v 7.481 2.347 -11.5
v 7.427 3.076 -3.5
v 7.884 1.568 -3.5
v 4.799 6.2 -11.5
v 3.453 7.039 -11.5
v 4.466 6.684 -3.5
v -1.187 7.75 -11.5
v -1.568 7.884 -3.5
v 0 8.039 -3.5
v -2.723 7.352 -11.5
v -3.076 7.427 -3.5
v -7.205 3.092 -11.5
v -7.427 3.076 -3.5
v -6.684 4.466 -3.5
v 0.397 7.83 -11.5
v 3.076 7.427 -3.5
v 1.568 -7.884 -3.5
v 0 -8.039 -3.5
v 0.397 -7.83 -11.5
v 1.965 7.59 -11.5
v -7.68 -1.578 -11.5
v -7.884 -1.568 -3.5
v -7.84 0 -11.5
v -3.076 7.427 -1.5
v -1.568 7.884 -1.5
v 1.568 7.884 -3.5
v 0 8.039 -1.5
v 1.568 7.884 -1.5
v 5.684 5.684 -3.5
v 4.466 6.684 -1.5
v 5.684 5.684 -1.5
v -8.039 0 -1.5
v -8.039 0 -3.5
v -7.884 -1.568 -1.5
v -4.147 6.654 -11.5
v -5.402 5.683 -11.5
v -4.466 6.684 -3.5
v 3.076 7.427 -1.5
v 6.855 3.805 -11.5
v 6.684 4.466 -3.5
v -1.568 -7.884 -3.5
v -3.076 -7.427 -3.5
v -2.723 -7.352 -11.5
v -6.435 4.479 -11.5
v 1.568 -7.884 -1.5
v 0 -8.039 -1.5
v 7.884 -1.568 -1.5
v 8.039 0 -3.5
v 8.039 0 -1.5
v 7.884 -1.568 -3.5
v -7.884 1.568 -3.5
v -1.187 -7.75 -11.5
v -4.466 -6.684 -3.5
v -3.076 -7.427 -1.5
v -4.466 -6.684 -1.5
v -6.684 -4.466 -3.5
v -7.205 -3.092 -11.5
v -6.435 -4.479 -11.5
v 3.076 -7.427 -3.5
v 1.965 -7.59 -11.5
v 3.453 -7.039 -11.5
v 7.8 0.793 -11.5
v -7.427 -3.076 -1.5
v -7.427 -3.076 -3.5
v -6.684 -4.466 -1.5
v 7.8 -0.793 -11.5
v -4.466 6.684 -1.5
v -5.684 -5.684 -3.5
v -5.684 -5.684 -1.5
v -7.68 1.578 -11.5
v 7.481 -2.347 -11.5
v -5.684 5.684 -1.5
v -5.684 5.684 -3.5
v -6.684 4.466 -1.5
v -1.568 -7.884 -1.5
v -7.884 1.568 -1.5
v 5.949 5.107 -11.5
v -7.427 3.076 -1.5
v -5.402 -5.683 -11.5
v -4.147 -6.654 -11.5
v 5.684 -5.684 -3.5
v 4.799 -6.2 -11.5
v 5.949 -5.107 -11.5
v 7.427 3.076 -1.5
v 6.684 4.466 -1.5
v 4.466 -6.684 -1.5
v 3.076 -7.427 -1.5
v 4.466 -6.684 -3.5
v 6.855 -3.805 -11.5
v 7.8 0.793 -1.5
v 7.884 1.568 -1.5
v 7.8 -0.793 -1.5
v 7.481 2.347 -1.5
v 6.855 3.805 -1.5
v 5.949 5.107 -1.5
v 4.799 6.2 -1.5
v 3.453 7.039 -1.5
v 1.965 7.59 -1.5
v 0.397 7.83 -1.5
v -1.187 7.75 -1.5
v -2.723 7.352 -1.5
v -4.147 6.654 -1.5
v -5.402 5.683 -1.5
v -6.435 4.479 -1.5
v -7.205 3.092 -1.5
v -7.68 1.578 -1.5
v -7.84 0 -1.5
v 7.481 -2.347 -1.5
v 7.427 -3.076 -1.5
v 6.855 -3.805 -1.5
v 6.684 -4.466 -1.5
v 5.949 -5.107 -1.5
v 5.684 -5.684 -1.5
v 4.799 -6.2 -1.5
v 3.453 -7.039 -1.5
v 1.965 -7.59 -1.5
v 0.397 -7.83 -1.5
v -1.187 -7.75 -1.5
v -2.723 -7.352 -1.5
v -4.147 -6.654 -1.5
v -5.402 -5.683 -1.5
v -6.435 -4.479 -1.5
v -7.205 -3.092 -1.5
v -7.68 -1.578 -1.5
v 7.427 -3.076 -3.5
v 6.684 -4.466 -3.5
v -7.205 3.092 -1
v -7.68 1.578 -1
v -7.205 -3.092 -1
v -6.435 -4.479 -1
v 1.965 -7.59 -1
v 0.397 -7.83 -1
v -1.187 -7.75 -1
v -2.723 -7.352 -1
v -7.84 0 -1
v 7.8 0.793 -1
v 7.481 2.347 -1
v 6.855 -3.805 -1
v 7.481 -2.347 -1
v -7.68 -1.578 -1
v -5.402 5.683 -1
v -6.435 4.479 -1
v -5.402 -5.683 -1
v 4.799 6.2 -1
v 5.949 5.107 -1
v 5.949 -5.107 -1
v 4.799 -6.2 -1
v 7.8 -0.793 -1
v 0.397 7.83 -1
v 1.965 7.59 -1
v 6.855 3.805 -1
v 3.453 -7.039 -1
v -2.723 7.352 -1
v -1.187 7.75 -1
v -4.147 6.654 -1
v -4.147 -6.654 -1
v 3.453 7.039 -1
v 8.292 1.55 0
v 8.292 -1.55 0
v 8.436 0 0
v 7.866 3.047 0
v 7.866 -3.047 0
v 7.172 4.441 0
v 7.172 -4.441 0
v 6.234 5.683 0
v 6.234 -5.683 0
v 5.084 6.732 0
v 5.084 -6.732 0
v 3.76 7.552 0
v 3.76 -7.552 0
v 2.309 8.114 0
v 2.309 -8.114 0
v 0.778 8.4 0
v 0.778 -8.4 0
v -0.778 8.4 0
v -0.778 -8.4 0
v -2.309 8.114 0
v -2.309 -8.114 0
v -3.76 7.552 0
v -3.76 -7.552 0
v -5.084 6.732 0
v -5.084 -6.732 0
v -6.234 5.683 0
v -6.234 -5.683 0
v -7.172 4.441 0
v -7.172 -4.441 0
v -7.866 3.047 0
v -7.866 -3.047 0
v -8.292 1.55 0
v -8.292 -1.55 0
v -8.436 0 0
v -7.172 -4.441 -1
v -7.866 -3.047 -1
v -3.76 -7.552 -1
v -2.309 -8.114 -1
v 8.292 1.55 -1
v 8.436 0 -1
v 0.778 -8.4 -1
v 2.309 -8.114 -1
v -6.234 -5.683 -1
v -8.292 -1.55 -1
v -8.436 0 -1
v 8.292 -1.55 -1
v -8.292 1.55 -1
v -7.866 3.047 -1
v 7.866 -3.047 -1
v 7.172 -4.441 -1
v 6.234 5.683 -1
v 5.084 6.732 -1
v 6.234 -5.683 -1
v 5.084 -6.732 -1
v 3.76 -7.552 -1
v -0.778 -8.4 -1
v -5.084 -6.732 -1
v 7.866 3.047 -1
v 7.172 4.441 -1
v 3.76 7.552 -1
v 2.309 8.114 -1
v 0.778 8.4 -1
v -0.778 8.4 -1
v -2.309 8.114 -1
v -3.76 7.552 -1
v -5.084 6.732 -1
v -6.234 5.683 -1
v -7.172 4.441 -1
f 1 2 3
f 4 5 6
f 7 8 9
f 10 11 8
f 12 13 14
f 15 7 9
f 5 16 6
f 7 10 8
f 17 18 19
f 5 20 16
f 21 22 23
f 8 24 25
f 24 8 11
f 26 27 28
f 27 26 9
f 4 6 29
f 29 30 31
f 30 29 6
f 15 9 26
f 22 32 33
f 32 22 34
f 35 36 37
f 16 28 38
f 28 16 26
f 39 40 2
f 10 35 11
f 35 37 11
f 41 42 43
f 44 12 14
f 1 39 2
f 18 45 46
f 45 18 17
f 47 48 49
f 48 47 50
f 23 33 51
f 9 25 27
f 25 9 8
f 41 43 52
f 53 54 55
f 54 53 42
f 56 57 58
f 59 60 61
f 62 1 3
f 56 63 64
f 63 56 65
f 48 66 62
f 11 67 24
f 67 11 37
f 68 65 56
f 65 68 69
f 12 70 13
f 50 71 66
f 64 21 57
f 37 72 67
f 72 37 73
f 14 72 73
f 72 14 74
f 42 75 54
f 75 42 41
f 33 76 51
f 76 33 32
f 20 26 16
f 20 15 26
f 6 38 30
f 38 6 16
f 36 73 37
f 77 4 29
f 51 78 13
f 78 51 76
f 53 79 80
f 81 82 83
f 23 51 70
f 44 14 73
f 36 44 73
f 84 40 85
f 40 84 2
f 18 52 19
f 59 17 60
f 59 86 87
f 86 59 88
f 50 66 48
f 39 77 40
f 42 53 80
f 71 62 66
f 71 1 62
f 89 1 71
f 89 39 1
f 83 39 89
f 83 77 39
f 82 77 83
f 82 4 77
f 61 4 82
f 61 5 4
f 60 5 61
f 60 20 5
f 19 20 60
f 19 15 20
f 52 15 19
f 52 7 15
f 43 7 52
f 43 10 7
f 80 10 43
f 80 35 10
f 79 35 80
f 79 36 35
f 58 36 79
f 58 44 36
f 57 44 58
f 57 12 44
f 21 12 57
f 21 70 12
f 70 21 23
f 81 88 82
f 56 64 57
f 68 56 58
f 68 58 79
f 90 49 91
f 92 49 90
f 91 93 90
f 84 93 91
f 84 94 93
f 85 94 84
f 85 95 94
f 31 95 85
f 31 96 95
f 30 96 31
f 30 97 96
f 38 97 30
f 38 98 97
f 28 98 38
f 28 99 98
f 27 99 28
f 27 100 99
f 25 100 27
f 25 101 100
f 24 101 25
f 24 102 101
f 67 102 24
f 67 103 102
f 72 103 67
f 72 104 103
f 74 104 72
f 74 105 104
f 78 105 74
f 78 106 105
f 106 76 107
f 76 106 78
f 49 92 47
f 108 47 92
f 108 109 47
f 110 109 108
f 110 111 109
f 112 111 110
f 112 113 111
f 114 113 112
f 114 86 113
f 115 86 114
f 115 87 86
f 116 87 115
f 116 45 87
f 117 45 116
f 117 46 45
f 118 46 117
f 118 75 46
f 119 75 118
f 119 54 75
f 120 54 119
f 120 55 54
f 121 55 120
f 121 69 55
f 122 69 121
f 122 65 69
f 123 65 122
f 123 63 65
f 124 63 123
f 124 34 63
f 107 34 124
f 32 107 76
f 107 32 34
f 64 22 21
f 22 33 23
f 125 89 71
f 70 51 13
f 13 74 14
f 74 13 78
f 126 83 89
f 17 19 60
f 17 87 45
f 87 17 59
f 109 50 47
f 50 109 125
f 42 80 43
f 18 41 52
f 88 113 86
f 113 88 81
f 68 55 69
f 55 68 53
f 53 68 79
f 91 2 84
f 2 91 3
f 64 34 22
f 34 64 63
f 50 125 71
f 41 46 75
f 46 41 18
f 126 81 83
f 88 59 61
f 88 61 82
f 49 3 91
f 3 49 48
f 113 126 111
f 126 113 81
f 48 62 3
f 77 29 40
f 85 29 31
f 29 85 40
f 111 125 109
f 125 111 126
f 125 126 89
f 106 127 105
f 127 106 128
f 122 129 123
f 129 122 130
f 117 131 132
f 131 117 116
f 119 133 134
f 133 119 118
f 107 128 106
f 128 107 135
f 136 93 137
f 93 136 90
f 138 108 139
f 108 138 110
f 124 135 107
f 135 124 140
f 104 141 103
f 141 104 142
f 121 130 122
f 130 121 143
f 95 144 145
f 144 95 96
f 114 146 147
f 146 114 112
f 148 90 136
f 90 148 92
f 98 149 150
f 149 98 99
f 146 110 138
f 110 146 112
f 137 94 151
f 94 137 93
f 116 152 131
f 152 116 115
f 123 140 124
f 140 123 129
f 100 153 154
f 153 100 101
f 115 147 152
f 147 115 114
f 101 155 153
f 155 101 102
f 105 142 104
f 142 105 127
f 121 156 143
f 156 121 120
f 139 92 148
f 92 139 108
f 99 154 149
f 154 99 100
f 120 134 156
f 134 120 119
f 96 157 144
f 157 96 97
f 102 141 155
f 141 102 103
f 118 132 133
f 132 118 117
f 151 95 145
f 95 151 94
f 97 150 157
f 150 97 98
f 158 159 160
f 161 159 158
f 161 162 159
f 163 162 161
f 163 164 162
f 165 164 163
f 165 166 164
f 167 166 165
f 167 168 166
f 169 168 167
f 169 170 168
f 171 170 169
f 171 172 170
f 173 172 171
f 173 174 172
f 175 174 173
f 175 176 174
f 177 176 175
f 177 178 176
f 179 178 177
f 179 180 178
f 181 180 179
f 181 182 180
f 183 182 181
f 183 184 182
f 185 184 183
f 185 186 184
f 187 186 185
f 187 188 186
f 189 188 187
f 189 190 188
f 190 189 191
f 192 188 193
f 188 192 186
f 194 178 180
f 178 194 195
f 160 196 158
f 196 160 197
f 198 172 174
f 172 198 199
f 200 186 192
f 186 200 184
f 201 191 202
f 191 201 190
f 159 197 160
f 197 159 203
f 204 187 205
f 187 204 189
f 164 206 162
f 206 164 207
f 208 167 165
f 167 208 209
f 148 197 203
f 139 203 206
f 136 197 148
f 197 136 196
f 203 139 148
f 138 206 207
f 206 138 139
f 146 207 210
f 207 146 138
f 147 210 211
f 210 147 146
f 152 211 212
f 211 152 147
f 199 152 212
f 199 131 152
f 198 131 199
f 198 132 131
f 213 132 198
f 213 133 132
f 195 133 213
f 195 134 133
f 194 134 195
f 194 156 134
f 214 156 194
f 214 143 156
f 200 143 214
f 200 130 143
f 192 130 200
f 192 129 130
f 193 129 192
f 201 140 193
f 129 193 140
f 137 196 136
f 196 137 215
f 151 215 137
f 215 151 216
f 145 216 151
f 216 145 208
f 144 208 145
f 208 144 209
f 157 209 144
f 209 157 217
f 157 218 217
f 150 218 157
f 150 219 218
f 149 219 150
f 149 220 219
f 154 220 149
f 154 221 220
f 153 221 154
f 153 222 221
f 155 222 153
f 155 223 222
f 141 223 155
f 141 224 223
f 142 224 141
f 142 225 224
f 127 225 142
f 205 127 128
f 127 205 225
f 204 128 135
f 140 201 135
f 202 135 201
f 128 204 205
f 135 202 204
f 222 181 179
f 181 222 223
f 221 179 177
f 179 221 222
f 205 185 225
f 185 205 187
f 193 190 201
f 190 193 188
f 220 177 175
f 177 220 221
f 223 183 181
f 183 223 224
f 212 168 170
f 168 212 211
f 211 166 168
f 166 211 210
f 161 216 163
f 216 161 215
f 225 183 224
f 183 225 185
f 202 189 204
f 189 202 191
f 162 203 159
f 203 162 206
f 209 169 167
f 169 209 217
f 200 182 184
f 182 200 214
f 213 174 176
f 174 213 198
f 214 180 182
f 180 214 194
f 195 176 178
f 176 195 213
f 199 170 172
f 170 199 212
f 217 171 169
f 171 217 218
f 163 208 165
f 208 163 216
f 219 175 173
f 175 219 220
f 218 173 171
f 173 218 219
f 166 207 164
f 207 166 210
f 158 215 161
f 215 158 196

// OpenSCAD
// file: cylinder_poly.scad
// Based on nophead research
module polyhole(d, h, center=false) {
    n = max(round(2 * d),3);
    rotate([0,0,180])
        cylinder(h = h, r = (d / 2) / cos (180 / n), $fn = n, center = center);
}

// make it interchangeable between this and cylinder
module cylinder_poly(r, h, center=false){
    polyhole(d=r*2, h=h, center=center);
}

cylinder_poly(5,5);
// main file
use <cylinder_poly.scad>

module bronze_bearing() {
	translate ([0, 0, -11.5]) difference() { 
		color ("DarkSlateGray") union () { 
			hull() {
				translate ([0,0,8]) cylinder_poly (h = 2, r = 16/2, center = false);
				translate ([0, 0, 0]) cylinder_poly (h = 2, r = 15.6/2, center = false);
			}
			translate ([0, 0, 0]) cylinder_poly (h = 11.5, r = 15.6/2, center = false);
			translate ([0, 0, 10.5]) cylinder_poly (h = 1, r = 16.8/2, center = false);
		}
		color ("grey") union () { 
			%translate ([0, 0, -0.1])  cylinder (h = 11.7, r = 8/2, center = false);
		}
	}
}

bronze_bearing();
